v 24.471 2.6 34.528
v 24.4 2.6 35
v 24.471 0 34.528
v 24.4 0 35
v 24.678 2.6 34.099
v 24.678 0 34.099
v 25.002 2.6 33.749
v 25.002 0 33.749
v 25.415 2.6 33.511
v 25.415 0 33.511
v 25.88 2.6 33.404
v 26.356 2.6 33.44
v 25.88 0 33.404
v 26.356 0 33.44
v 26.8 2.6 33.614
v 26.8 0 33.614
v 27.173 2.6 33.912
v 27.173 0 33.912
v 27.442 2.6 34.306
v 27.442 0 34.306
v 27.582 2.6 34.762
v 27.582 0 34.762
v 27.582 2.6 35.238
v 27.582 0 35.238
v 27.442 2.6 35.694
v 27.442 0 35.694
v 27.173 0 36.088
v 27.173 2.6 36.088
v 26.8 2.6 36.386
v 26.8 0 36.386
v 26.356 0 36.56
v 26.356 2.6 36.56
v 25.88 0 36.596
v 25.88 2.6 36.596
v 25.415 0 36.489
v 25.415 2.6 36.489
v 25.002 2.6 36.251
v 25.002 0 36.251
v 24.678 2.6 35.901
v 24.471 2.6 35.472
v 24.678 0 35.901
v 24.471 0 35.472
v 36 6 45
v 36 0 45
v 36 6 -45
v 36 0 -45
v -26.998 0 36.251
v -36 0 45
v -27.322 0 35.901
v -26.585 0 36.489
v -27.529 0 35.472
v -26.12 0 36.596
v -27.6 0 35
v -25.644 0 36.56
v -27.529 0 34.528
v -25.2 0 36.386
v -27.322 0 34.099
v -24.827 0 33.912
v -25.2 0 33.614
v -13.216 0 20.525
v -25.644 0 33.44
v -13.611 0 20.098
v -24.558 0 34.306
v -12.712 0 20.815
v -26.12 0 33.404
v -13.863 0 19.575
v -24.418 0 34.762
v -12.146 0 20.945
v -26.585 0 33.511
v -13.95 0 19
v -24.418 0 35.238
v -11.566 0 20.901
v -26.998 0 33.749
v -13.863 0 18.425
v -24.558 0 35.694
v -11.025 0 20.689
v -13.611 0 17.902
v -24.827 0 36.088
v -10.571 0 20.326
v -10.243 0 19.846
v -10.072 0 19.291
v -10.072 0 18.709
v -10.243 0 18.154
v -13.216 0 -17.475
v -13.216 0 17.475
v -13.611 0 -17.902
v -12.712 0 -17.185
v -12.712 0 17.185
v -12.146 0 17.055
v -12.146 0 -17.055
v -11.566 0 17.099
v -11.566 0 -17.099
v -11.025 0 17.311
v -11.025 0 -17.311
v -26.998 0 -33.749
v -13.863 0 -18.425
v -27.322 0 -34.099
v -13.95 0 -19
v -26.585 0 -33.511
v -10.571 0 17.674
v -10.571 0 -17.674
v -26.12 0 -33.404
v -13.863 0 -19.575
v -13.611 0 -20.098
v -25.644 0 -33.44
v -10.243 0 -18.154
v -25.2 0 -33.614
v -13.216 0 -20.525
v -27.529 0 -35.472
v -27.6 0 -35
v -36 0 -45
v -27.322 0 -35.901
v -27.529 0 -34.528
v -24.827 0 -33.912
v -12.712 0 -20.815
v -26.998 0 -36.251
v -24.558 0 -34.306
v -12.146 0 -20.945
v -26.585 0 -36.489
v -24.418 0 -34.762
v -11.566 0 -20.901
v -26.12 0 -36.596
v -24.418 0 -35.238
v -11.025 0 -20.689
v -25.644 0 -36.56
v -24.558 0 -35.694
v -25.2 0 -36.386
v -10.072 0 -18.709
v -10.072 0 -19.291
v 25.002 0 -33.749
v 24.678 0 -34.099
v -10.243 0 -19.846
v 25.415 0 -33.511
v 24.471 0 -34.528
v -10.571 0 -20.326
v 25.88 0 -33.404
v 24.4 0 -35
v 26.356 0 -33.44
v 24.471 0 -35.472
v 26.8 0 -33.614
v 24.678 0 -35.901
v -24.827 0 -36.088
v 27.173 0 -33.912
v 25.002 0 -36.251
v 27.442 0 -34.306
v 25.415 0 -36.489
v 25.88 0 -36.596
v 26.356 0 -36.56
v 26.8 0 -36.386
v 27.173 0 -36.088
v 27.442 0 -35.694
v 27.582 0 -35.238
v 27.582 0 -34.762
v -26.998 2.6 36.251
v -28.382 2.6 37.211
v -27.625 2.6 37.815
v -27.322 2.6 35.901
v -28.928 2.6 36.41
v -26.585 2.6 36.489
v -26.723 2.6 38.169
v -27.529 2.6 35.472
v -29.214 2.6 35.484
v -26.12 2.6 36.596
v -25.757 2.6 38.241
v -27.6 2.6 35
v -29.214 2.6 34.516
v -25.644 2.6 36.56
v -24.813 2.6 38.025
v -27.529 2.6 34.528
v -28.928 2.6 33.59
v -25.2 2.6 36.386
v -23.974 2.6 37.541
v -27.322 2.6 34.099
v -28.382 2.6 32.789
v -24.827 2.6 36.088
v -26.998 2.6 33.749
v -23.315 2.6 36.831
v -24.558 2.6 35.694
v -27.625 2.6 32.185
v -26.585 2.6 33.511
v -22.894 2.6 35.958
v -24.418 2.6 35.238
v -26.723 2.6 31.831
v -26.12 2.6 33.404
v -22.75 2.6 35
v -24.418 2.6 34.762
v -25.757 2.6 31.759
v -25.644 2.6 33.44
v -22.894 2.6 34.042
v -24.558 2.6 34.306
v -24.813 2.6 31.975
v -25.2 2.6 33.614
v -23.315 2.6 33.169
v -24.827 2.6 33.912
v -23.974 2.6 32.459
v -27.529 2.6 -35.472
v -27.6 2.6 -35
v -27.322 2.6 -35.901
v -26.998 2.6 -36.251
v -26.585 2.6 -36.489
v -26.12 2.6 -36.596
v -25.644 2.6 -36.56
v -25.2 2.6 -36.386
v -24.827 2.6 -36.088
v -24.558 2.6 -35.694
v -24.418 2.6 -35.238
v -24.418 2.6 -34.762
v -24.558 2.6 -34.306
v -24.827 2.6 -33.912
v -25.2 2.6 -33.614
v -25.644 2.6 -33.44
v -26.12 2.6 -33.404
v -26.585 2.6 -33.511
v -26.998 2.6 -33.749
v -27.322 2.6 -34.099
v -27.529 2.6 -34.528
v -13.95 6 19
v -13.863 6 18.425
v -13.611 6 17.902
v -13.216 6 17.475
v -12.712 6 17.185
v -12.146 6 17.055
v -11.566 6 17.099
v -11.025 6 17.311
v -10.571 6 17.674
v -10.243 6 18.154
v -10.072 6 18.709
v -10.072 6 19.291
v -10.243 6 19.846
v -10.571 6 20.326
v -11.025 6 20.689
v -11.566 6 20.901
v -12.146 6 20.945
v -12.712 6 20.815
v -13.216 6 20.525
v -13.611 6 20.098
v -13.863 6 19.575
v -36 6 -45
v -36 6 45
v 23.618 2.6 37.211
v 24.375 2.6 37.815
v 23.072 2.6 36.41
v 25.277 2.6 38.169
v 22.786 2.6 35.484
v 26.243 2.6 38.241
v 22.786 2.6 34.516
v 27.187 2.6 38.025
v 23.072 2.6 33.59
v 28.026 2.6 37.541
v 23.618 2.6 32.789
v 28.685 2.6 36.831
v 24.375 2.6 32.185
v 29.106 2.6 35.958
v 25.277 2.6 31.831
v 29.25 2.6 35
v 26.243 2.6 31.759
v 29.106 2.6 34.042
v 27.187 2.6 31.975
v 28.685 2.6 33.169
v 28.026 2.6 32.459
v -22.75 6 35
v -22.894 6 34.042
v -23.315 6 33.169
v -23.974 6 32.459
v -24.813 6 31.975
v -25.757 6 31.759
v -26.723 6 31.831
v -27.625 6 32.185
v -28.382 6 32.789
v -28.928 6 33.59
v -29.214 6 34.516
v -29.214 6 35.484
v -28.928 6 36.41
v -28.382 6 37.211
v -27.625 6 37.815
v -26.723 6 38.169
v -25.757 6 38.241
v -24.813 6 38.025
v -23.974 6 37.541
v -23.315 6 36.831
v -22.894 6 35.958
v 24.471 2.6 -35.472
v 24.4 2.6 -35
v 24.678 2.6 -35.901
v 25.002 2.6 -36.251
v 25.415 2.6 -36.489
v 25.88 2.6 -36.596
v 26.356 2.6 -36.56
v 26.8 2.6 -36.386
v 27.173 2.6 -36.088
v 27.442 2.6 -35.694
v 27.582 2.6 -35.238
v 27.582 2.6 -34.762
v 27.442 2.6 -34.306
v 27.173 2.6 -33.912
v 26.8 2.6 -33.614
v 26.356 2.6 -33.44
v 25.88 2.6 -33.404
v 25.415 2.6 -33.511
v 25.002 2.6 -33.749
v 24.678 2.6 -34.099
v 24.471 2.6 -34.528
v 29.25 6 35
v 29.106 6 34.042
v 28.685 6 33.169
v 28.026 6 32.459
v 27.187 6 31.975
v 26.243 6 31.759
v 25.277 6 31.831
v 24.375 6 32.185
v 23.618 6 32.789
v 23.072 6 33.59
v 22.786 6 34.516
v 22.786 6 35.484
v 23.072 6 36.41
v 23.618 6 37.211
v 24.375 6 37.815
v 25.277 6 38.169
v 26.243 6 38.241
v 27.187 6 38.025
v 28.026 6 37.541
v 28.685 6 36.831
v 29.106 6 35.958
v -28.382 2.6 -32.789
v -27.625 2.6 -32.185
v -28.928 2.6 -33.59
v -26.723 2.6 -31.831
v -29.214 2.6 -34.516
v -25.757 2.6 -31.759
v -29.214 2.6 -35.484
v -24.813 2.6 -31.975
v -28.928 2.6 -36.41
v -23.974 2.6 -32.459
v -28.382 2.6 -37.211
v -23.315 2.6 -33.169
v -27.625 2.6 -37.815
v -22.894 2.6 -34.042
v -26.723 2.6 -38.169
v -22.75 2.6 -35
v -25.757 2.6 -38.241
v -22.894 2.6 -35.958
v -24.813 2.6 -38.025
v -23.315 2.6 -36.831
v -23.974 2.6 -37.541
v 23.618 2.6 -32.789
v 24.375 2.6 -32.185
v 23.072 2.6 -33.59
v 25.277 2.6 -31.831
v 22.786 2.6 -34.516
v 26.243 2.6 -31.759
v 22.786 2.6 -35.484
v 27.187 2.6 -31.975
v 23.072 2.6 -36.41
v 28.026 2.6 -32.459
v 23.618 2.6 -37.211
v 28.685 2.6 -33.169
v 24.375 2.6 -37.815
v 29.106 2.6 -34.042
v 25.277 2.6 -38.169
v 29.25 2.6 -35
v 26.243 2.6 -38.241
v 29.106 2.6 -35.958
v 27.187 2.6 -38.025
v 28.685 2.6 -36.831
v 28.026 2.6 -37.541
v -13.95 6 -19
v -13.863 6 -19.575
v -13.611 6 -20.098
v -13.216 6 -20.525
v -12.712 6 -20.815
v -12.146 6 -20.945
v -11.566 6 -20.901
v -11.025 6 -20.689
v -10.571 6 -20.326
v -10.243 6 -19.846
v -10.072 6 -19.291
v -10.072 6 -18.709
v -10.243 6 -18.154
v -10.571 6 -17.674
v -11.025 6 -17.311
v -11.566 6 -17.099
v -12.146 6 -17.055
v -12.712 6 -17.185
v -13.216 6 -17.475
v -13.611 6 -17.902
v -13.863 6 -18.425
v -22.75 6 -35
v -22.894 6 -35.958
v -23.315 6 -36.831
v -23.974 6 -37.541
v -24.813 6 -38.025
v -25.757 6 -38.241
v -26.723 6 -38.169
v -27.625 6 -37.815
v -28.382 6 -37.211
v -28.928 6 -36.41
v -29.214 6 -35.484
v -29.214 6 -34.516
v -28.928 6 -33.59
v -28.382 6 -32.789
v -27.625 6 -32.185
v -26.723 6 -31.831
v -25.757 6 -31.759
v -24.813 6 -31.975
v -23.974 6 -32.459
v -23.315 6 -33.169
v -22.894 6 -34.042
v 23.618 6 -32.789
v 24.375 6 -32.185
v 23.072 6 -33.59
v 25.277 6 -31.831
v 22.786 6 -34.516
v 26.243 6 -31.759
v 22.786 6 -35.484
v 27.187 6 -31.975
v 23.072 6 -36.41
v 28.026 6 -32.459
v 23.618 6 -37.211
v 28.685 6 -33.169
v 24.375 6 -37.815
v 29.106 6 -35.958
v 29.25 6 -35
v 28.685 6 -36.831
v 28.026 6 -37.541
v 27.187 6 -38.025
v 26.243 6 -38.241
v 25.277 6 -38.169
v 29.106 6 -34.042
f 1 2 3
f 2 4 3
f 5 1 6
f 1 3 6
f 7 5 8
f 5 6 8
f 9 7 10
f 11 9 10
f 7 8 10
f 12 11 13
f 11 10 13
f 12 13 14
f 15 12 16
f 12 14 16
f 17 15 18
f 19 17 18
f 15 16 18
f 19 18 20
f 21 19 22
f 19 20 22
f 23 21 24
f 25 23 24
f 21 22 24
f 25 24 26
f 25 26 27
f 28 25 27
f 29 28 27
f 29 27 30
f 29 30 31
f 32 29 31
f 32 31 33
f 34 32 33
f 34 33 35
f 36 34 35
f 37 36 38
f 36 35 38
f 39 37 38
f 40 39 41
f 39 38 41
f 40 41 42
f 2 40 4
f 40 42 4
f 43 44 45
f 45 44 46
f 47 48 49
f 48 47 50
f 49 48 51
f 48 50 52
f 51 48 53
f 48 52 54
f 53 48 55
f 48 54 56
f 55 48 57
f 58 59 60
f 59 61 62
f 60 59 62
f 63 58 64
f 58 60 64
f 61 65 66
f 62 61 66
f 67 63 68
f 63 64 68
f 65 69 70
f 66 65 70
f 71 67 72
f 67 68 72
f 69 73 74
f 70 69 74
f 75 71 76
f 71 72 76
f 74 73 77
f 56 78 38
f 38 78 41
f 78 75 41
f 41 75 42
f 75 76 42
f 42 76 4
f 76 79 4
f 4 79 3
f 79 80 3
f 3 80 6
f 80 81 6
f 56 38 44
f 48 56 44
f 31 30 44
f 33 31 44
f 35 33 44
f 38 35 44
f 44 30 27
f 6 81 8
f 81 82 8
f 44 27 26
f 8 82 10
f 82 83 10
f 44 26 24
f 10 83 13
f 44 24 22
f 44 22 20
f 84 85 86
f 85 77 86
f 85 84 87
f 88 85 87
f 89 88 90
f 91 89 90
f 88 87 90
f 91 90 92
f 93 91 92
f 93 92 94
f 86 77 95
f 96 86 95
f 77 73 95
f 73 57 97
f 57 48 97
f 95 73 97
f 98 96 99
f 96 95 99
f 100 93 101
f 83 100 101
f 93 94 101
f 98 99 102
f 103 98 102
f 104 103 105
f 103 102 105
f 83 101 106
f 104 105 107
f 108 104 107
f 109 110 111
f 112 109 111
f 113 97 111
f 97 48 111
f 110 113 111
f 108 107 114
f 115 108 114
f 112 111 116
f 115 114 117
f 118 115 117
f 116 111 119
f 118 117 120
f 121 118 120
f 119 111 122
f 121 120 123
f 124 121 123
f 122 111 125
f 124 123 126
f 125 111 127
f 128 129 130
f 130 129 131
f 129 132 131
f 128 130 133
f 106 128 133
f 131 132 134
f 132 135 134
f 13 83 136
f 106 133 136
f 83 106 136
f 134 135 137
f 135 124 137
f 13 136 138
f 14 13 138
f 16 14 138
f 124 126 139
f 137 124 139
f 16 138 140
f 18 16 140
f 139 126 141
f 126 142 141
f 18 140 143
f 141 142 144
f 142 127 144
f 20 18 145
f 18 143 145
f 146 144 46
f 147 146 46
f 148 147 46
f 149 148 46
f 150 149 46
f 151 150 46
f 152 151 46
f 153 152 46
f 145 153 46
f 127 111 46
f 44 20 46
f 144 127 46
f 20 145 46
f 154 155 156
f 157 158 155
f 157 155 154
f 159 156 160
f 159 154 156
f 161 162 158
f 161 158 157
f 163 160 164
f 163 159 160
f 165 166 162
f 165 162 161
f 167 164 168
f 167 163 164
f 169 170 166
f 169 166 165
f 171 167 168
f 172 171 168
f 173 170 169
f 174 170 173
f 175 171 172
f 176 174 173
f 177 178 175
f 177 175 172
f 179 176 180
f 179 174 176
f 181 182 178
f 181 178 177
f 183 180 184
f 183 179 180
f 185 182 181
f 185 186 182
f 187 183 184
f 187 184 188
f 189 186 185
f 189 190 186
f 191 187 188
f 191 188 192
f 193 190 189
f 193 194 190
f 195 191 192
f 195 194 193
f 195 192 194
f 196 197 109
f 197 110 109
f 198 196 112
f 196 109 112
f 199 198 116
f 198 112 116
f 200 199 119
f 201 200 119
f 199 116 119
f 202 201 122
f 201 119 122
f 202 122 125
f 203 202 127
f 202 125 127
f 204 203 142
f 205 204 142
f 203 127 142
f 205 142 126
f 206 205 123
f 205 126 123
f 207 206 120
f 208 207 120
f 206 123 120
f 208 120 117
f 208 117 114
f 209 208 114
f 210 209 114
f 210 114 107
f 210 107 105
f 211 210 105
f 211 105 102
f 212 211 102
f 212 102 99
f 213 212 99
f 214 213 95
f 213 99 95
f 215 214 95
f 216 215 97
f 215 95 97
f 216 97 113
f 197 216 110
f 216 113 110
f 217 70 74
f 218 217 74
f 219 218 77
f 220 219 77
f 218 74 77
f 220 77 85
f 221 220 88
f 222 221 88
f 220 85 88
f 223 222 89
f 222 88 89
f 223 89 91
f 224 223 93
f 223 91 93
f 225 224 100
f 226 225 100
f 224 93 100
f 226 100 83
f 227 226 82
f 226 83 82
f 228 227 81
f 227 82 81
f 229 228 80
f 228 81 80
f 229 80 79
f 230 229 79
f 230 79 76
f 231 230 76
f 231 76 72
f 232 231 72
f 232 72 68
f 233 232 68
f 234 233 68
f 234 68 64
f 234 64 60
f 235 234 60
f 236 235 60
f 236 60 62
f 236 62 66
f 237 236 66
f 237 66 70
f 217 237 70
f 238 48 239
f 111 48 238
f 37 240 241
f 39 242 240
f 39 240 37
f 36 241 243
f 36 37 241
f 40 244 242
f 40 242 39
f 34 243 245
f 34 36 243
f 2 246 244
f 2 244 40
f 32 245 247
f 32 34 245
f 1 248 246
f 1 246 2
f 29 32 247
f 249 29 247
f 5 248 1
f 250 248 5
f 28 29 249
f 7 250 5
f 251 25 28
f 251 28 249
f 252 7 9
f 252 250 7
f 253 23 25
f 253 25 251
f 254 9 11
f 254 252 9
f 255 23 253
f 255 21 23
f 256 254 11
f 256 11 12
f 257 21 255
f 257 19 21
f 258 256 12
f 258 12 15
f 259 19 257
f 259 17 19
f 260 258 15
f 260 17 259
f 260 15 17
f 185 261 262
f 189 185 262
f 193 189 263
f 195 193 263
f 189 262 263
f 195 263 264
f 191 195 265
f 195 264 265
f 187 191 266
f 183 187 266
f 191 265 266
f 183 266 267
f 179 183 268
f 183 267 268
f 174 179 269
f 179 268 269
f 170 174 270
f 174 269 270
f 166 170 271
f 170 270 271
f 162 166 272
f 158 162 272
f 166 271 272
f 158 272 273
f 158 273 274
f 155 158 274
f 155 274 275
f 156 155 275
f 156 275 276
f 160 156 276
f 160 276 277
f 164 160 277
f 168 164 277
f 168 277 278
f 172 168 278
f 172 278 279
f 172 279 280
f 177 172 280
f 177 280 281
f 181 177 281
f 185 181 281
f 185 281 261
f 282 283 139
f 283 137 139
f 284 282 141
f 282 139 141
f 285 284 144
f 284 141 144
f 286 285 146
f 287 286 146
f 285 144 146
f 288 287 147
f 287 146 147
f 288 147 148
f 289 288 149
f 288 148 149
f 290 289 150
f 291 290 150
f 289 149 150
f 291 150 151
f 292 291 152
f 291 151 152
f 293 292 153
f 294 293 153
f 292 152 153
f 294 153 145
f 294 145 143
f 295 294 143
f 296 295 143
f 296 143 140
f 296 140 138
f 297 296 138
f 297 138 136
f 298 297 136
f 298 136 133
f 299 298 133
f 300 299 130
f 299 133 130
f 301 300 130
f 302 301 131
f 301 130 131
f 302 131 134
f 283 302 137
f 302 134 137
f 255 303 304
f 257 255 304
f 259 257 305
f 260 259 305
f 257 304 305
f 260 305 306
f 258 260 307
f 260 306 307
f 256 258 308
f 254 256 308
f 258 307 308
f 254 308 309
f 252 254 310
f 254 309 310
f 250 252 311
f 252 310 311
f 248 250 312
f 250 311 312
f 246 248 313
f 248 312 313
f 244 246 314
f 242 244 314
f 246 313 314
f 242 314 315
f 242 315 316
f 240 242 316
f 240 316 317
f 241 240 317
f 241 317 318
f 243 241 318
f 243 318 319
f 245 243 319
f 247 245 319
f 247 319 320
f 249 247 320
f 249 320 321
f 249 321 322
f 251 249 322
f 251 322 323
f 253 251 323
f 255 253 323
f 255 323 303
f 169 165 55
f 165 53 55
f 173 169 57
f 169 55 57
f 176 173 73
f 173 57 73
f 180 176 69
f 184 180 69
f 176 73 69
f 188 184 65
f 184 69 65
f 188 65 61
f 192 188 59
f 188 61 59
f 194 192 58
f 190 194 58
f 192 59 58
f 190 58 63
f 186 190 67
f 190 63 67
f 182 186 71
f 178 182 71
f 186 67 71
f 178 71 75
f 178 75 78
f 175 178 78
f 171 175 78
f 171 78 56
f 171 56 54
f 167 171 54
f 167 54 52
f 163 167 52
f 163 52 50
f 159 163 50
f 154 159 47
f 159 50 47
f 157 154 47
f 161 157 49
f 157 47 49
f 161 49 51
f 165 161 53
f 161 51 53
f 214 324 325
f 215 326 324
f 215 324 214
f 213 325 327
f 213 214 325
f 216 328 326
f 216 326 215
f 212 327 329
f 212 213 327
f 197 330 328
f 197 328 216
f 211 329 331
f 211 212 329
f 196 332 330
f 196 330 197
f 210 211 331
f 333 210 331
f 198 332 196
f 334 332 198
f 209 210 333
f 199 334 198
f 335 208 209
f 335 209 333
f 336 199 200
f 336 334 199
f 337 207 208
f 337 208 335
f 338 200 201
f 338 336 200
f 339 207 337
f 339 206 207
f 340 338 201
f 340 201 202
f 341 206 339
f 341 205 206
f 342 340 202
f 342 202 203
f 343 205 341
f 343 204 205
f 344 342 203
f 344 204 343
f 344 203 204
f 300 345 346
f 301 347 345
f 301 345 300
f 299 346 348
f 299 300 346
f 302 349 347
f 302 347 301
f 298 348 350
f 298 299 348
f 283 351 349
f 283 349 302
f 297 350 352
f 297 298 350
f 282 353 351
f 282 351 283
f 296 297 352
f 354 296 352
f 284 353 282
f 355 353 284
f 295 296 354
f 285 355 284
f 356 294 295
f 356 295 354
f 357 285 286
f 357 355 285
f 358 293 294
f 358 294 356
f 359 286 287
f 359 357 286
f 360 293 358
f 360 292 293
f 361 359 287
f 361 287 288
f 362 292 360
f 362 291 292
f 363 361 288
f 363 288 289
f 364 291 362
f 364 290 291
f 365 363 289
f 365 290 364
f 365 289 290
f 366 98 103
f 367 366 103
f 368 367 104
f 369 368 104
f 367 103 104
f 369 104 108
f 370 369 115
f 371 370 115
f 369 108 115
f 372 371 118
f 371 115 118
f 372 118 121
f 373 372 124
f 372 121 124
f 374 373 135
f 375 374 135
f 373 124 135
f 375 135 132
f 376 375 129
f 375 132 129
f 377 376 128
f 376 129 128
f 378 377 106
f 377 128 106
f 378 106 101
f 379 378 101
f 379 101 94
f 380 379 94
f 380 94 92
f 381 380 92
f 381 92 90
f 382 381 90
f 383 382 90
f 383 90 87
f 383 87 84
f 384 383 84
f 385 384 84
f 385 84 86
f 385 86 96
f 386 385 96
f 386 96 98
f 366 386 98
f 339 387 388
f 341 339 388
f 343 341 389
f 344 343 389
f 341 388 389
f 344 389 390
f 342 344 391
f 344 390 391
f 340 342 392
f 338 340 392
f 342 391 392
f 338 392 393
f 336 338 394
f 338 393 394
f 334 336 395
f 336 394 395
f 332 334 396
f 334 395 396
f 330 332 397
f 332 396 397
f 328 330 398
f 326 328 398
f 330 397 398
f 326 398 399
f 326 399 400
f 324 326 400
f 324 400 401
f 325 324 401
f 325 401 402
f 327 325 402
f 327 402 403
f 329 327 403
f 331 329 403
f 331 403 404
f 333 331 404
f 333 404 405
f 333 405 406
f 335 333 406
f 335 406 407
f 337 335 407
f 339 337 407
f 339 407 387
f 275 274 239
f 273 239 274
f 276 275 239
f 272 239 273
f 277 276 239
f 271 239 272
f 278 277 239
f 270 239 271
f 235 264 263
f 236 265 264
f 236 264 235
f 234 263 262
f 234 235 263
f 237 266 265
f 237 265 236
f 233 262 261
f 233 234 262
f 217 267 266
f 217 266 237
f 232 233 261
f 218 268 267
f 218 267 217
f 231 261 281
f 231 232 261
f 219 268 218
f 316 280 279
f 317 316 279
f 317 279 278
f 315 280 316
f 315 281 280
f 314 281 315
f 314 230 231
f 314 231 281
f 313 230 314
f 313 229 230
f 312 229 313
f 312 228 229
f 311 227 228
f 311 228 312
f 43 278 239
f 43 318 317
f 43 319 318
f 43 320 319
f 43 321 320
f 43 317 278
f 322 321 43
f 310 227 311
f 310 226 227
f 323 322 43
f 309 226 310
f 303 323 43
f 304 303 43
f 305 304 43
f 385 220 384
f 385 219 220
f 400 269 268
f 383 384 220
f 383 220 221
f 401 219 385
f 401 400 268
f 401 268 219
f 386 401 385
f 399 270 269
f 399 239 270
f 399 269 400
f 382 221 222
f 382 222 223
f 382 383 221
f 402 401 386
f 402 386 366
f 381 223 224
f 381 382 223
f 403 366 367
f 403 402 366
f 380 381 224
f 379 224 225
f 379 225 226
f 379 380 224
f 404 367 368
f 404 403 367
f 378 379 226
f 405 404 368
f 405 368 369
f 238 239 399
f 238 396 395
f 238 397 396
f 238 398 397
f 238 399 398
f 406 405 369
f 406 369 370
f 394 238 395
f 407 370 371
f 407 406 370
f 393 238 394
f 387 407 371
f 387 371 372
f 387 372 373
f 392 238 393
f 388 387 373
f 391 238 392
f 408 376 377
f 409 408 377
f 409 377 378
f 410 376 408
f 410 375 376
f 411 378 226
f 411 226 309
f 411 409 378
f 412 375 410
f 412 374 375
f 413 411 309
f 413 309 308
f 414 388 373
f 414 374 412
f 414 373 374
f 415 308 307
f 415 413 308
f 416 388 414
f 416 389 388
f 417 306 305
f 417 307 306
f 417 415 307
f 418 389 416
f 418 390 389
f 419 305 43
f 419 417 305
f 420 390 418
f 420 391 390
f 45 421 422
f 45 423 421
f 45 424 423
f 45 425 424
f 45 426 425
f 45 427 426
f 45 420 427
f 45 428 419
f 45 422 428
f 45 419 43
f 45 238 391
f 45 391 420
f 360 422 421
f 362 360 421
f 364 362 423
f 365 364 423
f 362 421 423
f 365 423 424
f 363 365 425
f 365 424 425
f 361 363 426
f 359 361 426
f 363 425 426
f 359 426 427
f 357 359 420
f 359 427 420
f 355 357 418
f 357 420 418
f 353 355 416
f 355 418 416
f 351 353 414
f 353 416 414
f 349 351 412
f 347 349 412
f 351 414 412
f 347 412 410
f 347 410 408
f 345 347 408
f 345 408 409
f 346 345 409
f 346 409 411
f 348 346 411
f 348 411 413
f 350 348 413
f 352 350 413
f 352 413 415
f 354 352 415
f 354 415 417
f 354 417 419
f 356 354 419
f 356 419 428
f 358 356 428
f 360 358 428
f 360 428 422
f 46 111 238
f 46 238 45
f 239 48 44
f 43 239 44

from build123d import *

# Parameters (mm, degrees)
SZKIC1_W                                            = 72
SZKIC1_H                                            = 90
DODANIE_WYCI_GNI_CIE1_DEPTH                         = 6
CBORE_FOR_M3_HEX_SOCKET_HEAD_CAP_SCREW1_D           = 3.2
CBORE_FOR_M3_HEX_SOCKET_HEAD_CAP_SCREW1_DEPTH       = 7.7
CBORE_FOR_M3_HEX_SOCKET_HEAD_CAP_SCREW1_CBORE_D     = 6.5
CBORE_FOR_M3_HEX_SOCKET_HEAD_CAP_SCREW1_CBORE_DEPTH = 3.4
CBORE_FOR_M3_HEX_SOCKET_HEAD_CAP_SCREW1_TIP         = 0.96137699
F_1_0MM_DOWEL_HOLE1_D                               = 3.9


with BuildPart() as part:
    # Szkic1 → Dodanie-wyciągnięcie1 (new body)
    with BuildSketch(Plane(origin=(0, 0, 0), x_dir=(1, 0, 0), z_dir=(0, 1, 0))):
        Rectangle(SZKIC1_W, SZKIC1_H)
    extrude(amount=DODANIE_WYCI_GNI_CIE1_DEPTH)

    # CBORE for M3 Hex Socket Head Cap Screw1
    with Locations(Plane(origin=(0, 6, 0), x_dir=(1, 0, 0), z_dir=(0, 1, 0))):
        with Locations((-26, 35), (26, 35), (26, -35), (-26, -35)):
            CounterBoreHole(CBORE_FOR_M3_HEX_SOCKET_HEAD_CAP_SCREW1_D / 2, CBORE_FOR_M3_HEX_SOCKET_HEAD_CAP_SCREW1_CBORE_D / 2, CBORE_FOR_M3_HEX_SOCKET_HEAD_CAP_SCREW1_CBORE_DEPTH, depth=CBORE_FOR_M3_HEX_SOCKET_HEAD_CAP_SCREW1_DEPTH)
            with Locations((0, 0, -(CBORE_FOR_M3_HEX_SOCKET_HEAD_CAP_SCREW1_DEPTH + CBORE_FOR_M3_HEX_SOCKET_HEAD_CAP_SCREW1_TIP / 2))):  # 118° drill point
                Cone(0, CBORE_FOR_M3_HEX_SOCKET_HEAD_CAP_SCREW1_D / 2, CBORE_FOR_M3_HEX_SOCKET_HEAD_CAP_SCREW1_TIP, mode=Mode.SUBTRACT)

    # Ø1.0mm Dowel Hole1 (through all)
    with Locations(Plane(origin=(0, 6, 0), x_dir=(1, 0, 0), z_dir=(0, 1, 0))):
        with Locations((-12, -19), (-12, 19)):
            Hole(F_1_0MM_DOWEL_HOLE1_D / 2)


solid = part.part
